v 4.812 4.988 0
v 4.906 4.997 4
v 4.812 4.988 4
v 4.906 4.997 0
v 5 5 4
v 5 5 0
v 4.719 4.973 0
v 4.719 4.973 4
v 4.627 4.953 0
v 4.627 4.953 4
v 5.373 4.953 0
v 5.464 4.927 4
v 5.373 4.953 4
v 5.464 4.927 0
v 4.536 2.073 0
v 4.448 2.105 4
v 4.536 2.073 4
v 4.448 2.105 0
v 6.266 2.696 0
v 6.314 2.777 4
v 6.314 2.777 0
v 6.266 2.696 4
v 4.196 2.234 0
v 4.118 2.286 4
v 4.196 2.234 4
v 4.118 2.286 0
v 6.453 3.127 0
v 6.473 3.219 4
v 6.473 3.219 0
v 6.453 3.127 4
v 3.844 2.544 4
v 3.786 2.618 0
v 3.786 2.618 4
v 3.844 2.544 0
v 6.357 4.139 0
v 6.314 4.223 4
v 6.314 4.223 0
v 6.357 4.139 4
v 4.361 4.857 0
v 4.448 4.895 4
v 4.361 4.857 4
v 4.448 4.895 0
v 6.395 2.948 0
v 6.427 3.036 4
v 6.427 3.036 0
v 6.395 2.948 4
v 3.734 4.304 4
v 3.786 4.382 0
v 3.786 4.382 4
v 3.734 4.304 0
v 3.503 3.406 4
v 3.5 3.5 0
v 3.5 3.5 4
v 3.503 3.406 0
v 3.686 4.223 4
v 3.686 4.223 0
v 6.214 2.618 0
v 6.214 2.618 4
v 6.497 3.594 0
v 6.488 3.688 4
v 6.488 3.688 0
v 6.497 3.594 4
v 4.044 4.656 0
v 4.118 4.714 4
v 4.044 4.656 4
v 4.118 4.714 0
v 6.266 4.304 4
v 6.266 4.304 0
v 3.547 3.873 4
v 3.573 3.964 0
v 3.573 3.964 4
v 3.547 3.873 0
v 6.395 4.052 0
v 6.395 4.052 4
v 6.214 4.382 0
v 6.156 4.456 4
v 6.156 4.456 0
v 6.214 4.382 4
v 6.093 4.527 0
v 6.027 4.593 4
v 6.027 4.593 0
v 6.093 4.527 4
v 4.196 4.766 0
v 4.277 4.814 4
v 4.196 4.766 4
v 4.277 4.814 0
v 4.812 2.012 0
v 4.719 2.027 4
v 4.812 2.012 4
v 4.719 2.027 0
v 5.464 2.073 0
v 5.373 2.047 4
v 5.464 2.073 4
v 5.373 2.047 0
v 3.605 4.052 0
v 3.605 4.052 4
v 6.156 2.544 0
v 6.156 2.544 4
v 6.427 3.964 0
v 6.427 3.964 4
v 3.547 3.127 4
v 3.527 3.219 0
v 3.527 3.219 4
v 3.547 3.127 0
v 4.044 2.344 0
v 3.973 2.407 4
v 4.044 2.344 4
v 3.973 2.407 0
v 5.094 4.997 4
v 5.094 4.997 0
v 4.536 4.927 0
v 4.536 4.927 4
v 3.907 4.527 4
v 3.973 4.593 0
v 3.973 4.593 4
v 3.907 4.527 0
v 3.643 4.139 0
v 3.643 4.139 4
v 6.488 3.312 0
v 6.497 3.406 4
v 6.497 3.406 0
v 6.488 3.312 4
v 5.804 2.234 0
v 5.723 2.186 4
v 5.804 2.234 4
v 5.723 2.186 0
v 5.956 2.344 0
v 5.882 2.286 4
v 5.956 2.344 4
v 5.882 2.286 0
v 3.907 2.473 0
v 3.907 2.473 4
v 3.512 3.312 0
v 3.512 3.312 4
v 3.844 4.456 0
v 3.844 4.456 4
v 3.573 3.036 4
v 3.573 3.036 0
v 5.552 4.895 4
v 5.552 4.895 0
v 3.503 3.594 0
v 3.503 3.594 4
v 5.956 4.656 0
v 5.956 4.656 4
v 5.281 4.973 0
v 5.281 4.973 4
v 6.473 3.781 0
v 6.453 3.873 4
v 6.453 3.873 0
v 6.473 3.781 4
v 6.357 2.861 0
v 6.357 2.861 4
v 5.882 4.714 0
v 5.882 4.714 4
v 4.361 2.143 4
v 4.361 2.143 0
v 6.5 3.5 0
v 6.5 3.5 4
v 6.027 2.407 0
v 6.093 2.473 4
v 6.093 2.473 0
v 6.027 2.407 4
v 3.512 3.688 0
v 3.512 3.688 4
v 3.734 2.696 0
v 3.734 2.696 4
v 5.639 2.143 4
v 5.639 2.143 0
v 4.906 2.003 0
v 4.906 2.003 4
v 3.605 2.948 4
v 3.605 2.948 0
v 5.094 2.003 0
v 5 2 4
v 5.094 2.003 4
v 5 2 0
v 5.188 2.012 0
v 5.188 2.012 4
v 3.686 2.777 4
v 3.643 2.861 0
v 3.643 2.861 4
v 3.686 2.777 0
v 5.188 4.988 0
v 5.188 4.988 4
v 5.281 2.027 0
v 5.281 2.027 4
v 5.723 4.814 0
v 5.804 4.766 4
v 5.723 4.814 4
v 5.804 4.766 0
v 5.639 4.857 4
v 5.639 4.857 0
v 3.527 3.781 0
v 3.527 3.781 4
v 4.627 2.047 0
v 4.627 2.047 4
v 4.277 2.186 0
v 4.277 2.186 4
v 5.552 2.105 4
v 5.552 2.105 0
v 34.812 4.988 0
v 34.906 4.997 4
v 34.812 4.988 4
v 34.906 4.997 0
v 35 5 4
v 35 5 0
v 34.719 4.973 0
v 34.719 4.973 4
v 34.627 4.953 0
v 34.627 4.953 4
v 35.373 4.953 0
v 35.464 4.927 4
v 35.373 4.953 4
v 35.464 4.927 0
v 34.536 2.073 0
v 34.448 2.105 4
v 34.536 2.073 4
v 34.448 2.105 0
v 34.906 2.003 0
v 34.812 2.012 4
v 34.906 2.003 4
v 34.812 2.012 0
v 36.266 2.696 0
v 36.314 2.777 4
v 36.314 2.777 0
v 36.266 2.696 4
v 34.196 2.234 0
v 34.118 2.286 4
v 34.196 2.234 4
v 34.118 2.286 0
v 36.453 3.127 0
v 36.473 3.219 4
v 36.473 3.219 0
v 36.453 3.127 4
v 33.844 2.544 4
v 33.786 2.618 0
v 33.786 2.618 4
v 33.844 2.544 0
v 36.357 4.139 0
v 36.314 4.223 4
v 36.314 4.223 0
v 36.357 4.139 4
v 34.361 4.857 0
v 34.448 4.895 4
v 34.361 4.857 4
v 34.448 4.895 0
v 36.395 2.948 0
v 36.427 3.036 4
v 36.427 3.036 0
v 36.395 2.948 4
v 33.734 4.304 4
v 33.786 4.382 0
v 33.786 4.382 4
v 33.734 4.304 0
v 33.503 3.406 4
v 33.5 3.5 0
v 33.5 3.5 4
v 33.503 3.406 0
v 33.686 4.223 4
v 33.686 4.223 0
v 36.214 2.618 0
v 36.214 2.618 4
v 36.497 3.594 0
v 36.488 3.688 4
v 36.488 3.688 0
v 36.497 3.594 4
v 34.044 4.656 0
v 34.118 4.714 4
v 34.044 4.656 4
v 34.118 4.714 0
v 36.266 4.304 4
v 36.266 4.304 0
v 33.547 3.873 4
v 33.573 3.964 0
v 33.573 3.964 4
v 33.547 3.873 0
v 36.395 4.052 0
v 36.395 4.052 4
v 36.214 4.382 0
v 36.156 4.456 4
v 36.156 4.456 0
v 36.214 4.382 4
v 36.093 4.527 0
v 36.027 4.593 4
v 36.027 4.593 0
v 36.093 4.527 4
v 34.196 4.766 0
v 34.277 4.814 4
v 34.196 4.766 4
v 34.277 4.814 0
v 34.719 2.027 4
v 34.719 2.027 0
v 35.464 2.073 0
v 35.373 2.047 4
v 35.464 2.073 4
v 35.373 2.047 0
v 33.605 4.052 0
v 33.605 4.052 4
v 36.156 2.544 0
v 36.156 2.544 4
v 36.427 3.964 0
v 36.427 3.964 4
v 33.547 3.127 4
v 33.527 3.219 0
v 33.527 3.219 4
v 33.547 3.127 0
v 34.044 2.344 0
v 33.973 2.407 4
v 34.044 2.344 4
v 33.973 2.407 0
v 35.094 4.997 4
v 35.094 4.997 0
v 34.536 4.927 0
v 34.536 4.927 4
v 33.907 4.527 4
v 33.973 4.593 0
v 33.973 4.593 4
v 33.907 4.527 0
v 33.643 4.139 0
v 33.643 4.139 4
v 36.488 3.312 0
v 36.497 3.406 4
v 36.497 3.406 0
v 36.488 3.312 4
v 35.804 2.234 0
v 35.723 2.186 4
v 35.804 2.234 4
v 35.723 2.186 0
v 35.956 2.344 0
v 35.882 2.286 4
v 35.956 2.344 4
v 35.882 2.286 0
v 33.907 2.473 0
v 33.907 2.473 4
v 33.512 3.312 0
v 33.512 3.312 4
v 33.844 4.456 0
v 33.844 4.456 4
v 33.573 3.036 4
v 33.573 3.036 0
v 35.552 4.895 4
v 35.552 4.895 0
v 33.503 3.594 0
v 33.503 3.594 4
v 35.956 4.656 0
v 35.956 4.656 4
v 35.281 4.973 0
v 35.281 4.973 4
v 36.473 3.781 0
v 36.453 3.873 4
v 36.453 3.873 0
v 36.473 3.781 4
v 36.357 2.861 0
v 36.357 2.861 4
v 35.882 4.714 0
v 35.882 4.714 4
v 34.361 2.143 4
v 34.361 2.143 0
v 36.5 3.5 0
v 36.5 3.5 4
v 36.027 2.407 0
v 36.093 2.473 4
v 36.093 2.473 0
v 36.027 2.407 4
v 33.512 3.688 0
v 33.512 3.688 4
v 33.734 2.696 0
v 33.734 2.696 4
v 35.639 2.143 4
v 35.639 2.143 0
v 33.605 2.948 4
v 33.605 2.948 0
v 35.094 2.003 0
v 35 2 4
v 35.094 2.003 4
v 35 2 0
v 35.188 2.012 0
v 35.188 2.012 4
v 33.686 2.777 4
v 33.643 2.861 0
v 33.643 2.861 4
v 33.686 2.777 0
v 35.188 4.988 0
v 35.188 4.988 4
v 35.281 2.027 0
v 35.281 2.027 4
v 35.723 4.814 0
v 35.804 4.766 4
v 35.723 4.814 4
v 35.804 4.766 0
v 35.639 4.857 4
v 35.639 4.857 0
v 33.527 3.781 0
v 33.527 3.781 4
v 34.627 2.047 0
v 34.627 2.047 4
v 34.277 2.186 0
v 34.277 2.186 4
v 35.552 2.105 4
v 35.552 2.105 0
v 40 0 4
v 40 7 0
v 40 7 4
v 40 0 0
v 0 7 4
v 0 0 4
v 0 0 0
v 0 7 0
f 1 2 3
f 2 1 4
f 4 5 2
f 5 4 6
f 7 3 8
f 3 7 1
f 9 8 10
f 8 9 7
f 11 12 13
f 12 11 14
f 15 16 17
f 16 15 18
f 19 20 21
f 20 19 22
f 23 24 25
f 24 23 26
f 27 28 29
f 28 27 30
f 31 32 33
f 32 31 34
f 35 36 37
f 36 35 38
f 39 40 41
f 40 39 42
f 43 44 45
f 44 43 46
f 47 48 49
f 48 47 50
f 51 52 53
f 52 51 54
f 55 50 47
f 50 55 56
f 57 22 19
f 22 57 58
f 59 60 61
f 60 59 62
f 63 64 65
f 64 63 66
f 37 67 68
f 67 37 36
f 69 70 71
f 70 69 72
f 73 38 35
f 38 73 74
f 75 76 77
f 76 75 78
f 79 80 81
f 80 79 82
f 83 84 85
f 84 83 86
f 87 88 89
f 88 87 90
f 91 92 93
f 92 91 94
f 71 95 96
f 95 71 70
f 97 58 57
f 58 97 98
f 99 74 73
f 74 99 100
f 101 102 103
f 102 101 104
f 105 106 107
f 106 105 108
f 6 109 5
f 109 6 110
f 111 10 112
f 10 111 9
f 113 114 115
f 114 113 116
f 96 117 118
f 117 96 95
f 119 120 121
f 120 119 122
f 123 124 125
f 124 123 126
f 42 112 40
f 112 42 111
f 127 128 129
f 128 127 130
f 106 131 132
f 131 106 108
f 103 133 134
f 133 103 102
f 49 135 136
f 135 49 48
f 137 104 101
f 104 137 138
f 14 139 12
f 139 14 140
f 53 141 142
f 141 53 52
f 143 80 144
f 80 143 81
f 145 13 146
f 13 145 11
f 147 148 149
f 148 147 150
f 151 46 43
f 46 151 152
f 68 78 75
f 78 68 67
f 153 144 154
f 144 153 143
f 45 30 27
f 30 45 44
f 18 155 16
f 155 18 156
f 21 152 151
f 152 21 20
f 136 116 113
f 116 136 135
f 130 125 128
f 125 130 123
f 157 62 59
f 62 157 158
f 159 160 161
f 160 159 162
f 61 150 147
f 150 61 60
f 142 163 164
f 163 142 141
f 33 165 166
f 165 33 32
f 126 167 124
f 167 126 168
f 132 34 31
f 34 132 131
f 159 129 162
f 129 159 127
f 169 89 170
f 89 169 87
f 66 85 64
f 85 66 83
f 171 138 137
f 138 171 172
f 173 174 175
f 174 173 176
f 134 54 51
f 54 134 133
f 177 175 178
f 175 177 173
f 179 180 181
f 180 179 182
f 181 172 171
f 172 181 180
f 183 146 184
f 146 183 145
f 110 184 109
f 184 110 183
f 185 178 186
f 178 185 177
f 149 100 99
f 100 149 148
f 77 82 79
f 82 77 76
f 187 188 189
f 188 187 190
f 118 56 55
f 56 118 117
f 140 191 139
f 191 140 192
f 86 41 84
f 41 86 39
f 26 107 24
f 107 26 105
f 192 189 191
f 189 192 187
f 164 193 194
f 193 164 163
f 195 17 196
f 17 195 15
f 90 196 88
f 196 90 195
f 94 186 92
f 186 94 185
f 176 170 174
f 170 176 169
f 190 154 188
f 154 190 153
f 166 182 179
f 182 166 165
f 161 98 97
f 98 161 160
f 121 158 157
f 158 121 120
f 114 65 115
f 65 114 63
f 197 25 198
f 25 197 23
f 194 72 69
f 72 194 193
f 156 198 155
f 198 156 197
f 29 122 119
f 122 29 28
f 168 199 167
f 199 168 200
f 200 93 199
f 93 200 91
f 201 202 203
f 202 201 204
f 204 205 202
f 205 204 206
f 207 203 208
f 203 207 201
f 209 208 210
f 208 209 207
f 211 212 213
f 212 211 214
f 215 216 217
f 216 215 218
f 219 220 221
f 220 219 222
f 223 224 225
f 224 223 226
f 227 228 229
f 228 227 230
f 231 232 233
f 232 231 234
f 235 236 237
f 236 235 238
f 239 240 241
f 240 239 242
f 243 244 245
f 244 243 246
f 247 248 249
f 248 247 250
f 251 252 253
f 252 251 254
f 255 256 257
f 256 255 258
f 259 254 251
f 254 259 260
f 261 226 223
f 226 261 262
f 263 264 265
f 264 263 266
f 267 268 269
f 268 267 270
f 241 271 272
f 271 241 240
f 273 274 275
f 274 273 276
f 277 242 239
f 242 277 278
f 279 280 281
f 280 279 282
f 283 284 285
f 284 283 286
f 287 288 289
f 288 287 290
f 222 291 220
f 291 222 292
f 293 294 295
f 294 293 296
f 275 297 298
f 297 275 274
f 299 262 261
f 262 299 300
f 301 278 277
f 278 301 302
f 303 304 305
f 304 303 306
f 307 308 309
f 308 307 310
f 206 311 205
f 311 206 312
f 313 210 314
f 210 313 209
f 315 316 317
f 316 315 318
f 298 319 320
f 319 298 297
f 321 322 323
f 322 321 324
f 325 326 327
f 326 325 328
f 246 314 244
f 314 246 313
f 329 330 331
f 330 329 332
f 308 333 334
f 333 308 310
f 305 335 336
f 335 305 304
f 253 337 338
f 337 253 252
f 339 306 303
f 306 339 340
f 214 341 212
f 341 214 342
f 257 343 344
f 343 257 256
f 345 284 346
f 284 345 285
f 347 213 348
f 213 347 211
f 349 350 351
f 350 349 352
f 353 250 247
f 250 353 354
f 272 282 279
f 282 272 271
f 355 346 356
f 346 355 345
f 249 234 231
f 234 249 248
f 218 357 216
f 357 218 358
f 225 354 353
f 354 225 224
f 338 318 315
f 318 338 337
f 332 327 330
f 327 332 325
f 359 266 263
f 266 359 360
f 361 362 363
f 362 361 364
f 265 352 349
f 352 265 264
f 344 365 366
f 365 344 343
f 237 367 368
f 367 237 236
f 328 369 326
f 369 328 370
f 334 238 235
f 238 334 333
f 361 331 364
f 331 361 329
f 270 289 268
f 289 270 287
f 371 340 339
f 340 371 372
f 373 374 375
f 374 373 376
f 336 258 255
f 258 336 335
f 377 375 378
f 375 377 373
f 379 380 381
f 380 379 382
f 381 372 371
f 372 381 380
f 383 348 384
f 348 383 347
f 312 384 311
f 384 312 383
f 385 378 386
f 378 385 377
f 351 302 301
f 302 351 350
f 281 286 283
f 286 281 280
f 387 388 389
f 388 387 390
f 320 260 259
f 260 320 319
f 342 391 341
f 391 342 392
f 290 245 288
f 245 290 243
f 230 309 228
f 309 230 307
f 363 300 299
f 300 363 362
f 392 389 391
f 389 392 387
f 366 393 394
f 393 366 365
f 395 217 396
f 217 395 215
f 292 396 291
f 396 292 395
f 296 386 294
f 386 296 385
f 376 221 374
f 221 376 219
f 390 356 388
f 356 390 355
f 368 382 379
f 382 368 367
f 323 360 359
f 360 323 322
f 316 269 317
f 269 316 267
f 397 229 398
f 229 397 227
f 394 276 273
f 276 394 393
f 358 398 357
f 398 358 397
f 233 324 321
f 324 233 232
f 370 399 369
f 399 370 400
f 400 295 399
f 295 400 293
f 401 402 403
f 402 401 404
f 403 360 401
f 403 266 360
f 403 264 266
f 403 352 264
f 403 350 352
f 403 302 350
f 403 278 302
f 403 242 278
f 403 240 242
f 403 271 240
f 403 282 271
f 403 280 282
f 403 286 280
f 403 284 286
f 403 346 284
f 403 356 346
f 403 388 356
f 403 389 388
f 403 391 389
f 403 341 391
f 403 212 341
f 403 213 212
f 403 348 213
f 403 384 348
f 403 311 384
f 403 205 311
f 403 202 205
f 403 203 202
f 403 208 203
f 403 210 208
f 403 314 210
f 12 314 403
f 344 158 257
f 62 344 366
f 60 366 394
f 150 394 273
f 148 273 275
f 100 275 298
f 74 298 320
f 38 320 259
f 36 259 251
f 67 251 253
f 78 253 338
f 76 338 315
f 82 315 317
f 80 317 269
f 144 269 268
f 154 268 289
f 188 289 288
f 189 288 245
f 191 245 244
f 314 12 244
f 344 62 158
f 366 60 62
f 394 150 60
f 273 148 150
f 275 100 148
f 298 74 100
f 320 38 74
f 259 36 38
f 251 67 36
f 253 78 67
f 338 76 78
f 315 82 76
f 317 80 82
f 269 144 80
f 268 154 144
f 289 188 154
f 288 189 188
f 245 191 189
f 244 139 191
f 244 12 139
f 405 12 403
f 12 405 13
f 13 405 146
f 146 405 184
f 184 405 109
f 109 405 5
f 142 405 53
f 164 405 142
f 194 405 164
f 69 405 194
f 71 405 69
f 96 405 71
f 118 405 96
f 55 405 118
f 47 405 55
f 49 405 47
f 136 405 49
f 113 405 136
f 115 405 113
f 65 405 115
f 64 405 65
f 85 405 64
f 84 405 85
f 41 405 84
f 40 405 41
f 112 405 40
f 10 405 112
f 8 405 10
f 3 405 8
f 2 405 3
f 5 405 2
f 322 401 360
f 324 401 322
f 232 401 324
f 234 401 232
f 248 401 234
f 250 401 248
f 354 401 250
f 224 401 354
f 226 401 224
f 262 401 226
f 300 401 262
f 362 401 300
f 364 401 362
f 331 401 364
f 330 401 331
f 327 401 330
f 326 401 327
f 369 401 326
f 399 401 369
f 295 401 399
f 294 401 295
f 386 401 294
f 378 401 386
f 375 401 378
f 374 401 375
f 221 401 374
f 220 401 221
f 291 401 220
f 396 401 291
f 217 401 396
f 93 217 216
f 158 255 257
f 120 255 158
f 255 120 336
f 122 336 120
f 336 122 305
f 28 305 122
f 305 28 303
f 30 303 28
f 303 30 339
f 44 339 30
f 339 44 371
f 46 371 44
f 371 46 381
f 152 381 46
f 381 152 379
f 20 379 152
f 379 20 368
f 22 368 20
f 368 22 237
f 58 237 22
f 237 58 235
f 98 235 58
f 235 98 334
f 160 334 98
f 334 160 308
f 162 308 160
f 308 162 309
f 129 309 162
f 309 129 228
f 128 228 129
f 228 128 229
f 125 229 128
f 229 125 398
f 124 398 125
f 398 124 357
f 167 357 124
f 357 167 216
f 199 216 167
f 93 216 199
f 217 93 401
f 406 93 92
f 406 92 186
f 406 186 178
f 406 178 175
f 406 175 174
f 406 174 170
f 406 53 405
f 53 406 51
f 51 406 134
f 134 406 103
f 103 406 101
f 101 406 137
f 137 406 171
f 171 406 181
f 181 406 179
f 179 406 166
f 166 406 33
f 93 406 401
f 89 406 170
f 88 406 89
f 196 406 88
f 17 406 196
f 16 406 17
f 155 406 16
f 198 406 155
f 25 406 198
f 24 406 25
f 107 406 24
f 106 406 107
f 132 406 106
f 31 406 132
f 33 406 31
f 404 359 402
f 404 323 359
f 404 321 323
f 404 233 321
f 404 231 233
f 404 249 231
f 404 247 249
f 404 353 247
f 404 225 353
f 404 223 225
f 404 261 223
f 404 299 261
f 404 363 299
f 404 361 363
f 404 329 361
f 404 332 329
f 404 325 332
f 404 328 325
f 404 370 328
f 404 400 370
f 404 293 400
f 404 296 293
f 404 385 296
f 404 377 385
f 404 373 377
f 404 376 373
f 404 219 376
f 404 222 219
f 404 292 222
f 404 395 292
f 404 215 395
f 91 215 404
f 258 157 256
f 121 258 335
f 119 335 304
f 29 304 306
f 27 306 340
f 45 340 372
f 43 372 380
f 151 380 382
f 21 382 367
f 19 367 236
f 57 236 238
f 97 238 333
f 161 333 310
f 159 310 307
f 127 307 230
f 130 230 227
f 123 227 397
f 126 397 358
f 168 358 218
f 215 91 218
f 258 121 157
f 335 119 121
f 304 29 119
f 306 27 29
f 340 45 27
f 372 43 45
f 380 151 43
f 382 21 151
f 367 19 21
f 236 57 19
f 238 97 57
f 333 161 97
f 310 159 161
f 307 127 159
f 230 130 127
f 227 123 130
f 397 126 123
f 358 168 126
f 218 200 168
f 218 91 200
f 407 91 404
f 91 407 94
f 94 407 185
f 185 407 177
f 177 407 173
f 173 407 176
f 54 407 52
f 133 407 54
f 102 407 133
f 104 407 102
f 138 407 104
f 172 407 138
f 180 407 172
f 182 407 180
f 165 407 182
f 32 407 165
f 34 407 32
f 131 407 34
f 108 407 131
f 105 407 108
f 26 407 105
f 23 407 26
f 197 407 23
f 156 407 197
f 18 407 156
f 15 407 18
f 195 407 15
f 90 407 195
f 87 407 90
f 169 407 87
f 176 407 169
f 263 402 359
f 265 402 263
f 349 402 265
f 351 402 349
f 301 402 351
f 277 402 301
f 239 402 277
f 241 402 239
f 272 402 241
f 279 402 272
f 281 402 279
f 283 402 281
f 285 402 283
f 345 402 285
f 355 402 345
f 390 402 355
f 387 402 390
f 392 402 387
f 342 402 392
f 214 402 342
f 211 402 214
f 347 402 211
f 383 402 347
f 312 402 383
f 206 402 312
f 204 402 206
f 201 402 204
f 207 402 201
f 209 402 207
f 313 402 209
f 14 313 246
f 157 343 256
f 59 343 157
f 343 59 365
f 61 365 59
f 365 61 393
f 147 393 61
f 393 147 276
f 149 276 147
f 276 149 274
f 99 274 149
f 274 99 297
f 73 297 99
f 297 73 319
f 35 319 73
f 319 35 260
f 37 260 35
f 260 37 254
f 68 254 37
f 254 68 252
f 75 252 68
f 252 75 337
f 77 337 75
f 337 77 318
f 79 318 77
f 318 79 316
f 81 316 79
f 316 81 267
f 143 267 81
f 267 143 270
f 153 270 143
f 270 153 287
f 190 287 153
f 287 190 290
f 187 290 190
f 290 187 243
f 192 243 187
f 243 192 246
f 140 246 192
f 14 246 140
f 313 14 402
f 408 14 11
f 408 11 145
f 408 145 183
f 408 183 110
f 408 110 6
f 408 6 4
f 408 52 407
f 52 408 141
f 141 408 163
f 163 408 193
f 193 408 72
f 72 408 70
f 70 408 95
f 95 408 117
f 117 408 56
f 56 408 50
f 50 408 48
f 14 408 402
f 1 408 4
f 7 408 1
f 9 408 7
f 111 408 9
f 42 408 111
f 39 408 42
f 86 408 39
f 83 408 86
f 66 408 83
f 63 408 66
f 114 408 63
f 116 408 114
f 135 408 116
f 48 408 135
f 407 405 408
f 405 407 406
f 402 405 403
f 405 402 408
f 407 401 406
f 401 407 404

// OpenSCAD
difference(){
	union(){ 

        translate([0,0,0]){
           cube([40,7,4], center=false);
        }                
	}
	union() {
        translate([5,3.5,-1]){
            rotate([0,0,90]){
                cylinder(h=6, r=1.5,$fn=100, center=false);
            }   
        }
        translate([35,3.5,-1]){
            rotate([0,0,90]){
                cylinder(h=6, r=1.5,$fn=100, center=false);
            }   
        }
	}
}
